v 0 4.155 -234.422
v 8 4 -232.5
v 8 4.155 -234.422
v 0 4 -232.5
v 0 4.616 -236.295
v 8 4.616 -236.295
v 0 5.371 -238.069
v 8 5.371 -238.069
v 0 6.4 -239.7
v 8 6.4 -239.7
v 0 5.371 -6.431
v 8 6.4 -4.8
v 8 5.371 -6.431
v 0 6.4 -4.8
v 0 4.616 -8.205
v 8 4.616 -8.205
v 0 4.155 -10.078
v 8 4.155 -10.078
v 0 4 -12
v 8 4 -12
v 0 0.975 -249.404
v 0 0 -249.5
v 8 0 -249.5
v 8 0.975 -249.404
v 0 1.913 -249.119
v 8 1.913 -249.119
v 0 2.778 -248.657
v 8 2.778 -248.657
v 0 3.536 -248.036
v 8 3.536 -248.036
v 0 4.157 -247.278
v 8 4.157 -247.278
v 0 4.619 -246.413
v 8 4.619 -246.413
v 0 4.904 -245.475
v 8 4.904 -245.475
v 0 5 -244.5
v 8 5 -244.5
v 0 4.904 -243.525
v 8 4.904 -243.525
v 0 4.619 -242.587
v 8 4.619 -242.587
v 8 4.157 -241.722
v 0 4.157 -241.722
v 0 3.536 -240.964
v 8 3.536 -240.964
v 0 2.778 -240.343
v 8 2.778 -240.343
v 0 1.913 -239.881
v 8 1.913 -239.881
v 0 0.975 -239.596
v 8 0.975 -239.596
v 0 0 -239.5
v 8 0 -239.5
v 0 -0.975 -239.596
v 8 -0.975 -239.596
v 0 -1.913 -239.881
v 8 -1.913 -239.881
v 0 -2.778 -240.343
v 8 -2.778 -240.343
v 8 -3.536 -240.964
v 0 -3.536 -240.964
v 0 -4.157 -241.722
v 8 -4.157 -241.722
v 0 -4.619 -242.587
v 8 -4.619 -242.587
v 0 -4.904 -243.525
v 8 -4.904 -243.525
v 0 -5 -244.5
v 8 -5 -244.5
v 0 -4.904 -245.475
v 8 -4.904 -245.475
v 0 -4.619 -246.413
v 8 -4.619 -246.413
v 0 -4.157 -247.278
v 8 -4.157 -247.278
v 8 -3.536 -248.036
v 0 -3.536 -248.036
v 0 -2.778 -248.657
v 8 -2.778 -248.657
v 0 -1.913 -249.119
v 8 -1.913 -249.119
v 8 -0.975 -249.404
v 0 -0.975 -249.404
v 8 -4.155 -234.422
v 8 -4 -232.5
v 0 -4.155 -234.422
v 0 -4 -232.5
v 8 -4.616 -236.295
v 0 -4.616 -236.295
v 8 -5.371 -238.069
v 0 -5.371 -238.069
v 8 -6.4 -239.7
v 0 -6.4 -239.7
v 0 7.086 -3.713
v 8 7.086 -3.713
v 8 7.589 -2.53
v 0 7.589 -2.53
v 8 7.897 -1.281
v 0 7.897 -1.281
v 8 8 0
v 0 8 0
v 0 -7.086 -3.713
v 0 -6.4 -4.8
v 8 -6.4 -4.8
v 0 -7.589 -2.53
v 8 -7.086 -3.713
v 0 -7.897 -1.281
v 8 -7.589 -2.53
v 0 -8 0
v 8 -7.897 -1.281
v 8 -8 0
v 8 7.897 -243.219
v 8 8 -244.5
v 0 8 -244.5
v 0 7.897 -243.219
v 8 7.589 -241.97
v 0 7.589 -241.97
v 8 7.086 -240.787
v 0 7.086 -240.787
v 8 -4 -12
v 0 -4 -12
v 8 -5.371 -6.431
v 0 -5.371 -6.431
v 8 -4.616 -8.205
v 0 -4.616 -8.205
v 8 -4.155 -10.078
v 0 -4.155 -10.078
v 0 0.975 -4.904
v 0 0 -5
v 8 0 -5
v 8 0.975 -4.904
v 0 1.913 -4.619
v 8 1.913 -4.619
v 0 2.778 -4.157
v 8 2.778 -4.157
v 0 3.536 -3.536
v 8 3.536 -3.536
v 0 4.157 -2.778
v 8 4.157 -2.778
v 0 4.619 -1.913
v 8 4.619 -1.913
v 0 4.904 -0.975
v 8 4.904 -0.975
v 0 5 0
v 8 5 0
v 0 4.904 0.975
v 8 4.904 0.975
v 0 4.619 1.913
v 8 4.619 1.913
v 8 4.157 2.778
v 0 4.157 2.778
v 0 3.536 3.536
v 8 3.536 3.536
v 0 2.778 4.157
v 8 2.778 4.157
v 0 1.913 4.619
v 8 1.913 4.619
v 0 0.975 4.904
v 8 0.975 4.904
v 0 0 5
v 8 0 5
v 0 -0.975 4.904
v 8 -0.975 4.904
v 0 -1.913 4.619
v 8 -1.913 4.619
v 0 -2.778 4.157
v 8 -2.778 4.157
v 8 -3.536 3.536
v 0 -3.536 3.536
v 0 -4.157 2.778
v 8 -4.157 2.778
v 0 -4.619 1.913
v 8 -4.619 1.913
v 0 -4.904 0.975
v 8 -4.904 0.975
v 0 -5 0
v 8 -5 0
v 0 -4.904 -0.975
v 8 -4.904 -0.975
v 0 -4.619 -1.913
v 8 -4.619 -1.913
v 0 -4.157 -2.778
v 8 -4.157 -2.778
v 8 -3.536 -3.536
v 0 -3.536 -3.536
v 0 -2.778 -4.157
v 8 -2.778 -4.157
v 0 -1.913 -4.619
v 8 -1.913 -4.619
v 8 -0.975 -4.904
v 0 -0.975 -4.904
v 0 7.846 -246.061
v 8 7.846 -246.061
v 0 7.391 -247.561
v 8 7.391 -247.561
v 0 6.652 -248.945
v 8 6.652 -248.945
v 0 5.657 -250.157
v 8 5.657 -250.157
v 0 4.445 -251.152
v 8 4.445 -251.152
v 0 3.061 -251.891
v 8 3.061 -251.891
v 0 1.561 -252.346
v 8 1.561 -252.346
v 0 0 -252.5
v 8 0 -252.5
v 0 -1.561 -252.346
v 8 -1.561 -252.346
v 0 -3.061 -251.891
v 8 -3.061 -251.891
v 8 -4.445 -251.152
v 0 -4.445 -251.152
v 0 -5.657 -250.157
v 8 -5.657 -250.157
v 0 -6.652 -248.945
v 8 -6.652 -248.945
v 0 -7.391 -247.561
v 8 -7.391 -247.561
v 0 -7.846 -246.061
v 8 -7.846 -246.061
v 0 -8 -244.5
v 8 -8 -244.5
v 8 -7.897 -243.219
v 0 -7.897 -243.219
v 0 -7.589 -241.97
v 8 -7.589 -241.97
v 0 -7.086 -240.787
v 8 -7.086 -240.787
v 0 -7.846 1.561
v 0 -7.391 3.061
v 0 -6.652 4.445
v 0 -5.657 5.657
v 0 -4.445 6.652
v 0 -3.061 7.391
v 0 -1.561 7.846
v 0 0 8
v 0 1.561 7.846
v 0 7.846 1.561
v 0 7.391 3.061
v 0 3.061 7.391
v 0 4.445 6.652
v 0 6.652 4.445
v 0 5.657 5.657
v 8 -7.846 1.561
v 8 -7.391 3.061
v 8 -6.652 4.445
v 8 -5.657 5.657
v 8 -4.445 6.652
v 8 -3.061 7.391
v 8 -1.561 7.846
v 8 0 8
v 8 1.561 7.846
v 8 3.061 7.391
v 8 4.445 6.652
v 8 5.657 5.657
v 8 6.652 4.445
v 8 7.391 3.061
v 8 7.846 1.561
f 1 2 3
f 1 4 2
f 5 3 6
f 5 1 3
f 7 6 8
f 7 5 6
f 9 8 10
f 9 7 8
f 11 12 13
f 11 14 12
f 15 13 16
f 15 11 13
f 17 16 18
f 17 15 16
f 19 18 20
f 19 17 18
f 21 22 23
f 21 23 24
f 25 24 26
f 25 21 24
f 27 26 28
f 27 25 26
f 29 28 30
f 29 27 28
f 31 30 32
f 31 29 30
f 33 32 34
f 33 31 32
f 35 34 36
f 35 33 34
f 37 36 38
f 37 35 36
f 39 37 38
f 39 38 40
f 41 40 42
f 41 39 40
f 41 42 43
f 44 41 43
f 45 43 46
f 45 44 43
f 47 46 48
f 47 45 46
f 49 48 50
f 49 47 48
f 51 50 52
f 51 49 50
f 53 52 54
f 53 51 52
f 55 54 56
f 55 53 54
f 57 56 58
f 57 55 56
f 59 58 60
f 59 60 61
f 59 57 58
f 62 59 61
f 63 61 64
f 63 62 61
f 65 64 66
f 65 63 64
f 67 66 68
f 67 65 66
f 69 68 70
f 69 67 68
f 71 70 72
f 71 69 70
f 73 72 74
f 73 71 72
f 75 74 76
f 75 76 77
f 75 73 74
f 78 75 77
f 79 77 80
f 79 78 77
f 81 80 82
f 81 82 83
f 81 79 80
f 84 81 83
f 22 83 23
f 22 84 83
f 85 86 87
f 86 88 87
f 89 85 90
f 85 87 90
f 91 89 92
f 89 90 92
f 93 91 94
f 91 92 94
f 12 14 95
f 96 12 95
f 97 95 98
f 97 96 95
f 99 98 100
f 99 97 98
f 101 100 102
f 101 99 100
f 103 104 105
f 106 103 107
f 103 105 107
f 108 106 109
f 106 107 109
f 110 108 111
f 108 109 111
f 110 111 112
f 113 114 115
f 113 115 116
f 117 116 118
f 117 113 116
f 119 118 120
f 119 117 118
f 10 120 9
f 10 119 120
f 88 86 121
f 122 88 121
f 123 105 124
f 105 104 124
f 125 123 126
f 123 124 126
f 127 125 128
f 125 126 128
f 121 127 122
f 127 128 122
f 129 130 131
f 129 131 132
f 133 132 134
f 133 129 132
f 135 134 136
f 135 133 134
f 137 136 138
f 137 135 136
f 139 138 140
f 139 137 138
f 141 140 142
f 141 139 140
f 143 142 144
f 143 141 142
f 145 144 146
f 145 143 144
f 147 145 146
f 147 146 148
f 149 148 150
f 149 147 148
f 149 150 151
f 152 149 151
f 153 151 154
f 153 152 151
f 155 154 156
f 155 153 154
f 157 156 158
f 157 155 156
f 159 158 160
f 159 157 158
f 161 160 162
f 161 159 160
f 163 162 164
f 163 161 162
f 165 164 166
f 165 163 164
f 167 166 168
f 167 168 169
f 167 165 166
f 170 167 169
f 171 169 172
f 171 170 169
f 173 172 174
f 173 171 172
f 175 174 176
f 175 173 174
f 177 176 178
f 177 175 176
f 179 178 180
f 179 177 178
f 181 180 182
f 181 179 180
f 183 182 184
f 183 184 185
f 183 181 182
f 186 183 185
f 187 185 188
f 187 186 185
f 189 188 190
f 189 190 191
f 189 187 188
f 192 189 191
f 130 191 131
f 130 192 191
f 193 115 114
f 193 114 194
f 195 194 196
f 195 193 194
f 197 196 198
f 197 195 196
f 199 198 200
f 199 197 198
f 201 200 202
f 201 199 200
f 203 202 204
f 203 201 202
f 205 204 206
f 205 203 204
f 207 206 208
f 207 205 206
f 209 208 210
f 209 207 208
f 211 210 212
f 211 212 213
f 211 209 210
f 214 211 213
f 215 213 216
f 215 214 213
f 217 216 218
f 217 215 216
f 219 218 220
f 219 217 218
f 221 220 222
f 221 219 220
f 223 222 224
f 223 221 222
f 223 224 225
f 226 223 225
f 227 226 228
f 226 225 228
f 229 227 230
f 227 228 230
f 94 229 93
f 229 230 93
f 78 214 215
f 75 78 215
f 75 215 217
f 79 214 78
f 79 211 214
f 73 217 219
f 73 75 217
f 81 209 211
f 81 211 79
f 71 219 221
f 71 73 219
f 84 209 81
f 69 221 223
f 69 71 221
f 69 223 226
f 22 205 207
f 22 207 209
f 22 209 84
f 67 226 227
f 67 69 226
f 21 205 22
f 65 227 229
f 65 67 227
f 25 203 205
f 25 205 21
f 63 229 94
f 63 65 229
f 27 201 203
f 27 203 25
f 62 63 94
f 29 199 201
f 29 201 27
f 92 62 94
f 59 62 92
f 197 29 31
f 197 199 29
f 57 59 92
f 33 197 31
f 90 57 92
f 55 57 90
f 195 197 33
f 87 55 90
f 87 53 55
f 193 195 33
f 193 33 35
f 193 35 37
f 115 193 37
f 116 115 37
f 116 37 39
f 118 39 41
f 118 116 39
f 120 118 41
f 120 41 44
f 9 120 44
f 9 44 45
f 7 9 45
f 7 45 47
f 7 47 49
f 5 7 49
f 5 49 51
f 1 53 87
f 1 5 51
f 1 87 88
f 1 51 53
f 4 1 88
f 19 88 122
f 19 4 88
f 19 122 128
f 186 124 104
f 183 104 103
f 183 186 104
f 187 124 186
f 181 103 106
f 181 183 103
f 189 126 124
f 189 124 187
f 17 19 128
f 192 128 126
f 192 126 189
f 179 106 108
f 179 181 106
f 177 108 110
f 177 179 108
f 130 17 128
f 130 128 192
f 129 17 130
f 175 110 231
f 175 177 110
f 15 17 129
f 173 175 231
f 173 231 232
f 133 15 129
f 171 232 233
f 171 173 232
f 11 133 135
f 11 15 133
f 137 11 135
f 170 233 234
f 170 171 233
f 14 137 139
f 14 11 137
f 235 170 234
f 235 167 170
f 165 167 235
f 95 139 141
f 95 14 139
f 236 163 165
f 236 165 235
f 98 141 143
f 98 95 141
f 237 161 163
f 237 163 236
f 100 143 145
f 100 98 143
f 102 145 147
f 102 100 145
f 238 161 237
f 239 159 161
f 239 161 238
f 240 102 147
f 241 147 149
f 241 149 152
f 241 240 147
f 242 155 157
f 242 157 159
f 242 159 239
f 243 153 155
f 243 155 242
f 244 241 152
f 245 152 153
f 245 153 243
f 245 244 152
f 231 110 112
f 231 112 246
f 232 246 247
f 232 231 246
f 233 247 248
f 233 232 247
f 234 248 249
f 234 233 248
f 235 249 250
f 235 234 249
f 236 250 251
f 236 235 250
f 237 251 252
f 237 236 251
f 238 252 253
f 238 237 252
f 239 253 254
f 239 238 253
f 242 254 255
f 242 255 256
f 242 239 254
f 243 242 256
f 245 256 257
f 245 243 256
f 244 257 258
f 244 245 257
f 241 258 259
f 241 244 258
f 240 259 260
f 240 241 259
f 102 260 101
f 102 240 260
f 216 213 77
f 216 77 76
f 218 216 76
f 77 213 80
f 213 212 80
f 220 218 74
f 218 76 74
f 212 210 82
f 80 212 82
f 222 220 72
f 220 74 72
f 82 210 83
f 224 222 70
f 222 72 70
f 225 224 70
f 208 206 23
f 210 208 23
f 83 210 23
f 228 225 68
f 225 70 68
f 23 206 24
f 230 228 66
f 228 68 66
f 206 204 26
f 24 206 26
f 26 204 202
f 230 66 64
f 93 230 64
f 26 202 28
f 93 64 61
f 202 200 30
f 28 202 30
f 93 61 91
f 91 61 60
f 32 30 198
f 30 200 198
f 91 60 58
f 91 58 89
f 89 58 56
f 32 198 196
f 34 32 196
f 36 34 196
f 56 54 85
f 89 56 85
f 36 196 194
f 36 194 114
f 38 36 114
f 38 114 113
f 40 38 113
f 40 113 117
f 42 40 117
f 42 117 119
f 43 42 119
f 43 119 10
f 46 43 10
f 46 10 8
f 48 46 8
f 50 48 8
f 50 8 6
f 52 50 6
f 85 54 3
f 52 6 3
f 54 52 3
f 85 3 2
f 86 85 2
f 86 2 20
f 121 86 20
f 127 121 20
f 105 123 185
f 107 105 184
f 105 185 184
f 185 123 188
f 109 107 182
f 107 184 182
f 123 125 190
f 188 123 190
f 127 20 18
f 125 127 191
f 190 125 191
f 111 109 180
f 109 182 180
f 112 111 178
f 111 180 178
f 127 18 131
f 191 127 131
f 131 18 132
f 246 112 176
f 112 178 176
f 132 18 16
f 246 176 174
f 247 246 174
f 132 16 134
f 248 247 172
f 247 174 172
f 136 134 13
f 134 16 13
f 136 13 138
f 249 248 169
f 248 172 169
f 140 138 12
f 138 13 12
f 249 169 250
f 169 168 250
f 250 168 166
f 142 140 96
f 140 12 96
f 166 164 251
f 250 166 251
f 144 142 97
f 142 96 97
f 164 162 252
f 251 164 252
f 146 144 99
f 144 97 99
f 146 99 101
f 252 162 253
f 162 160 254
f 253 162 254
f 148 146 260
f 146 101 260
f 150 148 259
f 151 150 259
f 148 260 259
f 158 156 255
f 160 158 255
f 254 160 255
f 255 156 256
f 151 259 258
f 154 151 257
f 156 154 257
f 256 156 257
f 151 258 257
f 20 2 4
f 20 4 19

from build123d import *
from build123d.topology import SkipClean

# Parameters (mm, degrees)
SKETCH_1_R          = 5
EXTRUDE_1_DEPTH     = 8
CUT_EXTRUDE_1_DEPTH = 253.753338257
FILLET_1_R          = 12


with BuildPart() as part:
    # 草图1 → 凸台-拉伸1 (new body)
    with BuildSketch(Plane(origin=(0, 0, 0), x_dir=(0, 0, -1), z_dir=(1, 0, 0))):
        with BuildLine():
            Line((0, 8), (244.5, 8))
            ThreePointArc((244.5, 8), (252.5, 0), (244.5, -8))
            Line((244.5, -8), (0, -8))
            ThreePointArc((0, -8), (-8, 0), (0, 8))
        make_face()
        with Locations((244.5, 0)):
            Circle(SKETCH_1_R, mode=Mode.SUBTRACT)
        Circle(SKETCH_1_R, mode=Mode.SUBTRACT)
    extrude(amount=EXTRUDE_1_DEPTH)

    # 草图2 → 切除-拉伸1 (cut, through all)
    with SkipClean():  # the faces are left unmerged after this step: merging them gives an invalid solid
        with BuildSketch(Plane(origin=(8, 0, 0), x_dir=(0, 0, -1), z_dir=(1, 0, 0))):
            with BuildLine():
                Line((237.57179677, -4), (6.92820323, -4))
                ThreePointArc((6.92820323, -4), (4, -6.92820323), (0, -8))
                Line((0, -8), (244.5, -8))
                ThreePointArc((244.5, -8), (240.5, -6.92820323), (237.57179677, -4))
            make_face()
            with BuildLine():
                Line((237.57179677, 4), (6.92820323, 4))
                ThreePointArc((6.92820323, 4), (4, 6.92820323), (0, 8))
                Line((0, 8), (244.5, 8))
                ThreePointArc((244.5, 8), (240.5, 6.92820323), (237.57179677, 4))
            make_face()
        extrude(amount=-CUT_EXTRUDE_1_DEPTH, mode=Mode.SUBTRACT)

    # 圆角1
    fillet_1_edges = [part.edges().sort_by_distance(p)[0] for p in [
        (4, -4, -6.92820323),
        (4, -4, -237.57179677),
        (4, 4, -237.57179677),
        (4, 4, -6.92820323),
    ]]
    fillet(fillet_1_edges, radius=FILLET_1_R)


with BuildPart() as part_1:
    # Move Body 5: moved
    add(part.part.moved(Location((0, 0, 244.5))))


with BuildPart() as part_2:
    # Move Body 3: moved
    add(part_1.part.moved(Location((0, 0, -244.5))))


solid = part_2.part
